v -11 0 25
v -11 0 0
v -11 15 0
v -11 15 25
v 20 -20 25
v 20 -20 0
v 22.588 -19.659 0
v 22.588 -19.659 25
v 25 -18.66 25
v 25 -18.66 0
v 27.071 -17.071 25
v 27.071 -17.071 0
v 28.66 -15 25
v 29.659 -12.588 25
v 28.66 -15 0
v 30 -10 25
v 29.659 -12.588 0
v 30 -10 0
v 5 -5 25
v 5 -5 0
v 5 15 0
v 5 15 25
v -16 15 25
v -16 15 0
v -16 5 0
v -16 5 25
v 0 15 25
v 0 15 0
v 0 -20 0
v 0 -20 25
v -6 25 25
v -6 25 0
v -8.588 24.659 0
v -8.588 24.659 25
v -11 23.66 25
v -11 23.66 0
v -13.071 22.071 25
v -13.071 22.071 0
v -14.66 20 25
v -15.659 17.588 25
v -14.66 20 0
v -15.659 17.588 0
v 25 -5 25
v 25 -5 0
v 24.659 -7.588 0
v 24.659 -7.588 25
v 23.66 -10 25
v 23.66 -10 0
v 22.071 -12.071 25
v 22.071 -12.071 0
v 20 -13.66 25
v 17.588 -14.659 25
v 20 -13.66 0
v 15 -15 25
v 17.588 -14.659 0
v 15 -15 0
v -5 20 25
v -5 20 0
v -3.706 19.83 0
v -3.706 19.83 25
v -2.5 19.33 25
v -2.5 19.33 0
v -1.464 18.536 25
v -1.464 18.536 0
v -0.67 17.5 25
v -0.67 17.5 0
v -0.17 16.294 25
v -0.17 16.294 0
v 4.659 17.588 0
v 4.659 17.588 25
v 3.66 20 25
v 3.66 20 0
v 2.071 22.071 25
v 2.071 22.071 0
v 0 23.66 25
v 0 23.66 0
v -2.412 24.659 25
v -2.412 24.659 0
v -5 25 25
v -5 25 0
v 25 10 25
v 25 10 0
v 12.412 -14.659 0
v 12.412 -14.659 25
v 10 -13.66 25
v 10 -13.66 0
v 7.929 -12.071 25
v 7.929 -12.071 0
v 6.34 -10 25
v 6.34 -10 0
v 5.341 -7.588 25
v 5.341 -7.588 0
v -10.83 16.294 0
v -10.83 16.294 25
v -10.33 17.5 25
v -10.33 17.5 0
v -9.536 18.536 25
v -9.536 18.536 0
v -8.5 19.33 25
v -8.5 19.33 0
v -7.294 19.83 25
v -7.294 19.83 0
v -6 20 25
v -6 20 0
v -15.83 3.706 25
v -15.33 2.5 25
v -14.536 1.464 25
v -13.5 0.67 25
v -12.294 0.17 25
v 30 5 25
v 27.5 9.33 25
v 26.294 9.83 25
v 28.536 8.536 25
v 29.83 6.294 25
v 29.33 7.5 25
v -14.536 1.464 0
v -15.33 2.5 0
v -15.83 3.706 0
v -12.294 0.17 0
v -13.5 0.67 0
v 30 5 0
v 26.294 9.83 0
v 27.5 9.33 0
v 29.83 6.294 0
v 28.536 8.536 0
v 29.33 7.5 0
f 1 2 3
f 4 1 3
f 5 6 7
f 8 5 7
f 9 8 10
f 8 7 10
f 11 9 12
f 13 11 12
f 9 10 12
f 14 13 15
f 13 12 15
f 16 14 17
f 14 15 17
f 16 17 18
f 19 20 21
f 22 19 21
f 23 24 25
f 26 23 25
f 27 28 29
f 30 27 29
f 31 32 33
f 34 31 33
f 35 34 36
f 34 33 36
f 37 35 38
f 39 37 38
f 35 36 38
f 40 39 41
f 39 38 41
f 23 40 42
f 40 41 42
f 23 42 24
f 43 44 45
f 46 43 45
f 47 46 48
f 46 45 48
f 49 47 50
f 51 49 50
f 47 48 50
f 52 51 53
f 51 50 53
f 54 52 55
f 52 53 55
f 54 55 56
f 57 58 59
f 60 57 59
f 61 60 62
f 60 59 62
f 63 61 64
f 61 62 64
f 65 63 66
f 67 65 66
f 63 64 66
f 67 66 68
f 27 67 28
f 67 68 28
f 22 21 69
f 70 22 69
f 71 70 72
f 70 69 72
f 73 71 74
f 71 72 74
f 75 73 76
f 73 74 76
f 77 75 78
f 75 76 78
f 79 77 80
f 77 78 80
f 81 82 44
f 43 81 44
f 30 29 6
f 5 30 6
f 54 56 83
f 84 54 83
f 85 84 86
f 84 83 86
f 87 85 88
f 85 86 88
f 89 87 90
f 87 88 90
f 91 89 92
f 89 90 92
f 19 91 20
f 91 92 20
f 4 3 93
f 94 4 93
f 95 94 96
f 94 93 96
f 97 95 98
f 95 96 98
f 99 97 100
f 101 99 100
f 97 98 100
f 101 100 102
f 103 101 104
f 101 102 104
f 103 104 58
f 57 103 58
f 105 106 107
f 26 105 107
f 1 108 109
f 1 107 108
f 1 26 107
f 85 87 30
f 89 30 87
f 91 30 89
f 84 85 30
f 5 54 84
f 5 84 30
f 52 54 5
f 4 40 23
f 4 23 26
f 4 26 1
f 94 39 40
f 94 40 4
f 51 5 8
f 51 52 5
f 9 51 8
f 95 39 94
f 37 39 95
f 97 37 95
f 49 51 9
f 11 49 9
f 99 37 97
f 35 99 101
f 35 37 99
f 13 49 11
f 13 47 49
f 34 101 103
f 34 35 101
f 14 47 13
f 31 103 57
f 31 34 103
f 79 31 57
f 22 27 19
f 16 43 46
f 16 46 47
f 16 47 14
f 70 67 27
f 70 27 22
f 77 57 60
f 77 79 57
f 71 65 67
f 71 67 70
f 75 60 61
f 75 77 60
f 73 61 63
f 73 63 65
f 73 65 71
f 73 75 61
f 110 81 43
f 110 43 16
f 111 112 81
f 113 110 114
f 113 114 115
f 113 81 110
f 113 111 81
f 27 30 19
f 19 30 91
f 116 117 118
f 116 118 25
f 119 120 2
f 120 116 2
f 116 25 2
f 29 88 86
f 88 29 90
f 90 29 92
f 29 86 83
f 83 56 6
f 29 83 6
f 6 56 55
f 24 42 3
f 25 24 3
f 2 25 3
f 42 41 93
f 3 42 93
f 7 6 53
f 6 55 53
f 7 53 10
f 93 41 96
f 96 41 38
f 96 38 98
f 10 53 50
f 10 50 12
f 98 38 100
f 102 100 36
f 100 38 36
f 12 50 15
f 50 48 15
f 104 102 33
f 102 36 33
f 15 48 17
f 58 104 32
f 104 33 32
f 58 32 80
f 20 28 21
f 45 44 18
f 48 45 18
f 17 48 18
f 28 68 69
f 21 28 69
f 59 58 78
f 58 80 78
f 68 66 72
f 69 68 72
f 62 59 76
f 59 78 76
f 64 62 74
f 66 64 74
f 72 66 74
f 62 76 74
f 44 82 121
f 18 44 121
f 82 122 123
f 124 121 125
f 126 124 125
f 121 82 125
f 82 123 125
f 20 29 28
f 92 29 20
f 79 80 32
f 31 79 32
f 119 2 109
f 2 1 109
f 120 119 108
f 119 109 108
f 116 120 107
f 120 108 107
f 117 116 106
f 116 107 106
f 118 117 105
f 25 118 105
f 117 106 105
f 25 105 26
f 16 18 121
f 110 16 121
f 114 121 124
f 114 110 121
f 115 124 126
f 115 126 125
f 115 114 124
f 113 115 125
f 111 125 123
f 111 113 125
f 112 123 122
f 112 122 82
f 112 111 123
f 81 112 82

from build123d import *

# Parameters (mm, degrees)
F1_DEPTH = 25
F2_R     = 4.99999
F3_R     = 4.99999


# Not quite as in the source:
# - a fillet or chamfer is up to 0.001 mm smaller than in the source, because OpenCascade refuses the exact size


with BuildPart() as f1:
    # F0 (on Top) → F1 (new body)
    with BuildSketch(Plane.XY):
        with BuildLine():
            Line((-16, 0), (-11, 0))
            Line((-11, 0), (-11, 15))
            ThreePointArc((-11, 15), (-9.5355339059, 18.5355339059), (-6, 20))
            Line((-6, 20), (-5, 20))
            ThreePointArc((-5, 20), (-1.4644660941, 18.5355339059), (0, 15))
            Line((0, 15), (0, -20))
            Line((0, -20), (20, -20))
            ThreePointArc((20, -20), (27.0710678119, -17.0710678119), (30, -10))
            Line((30, -10), (30, 10))
            Line((30, 10), (25, 10))
            Line((25, 10), (25, -1.100000754))
            Line((25, -1.100000754), (25, -5))
            ThreePointArc((25, -5), (22.0710678119, -12.0710678119), (15, -15))
            ThreePointArc((15, -15), (7.9289321881, -12.0710678119), (5, -5))
            Line((5, -5), (5, 15))
            ThreePointArc((5, 15), (2.0710678119, 22.0710678119), (-5, 25))
            Line((-5, 25), (-6, 25))
            ThreePointArc((-6, 25), (-13.0710678119, 22.0710678119), (-16, 15))
            Line((-16, 15), (-16, 0))
        make_face()
    extrude(amount=F1_DEPTH)

    # F2 (radius 5 in the source; OpenCascade refuses exactly that, so slightly less here)
    f2_edges = [f1.edges().sort_by_distance(p)[0] for p in [
        (30, 10, 12.5),
    ]]
    fillet(f2_edges, radius=F2_R)

    # F3 (radius 5 in the source; OpenCascade refuses exactly that, so slightly less here)
    f3_edges = [f1.edges().sort_by_distance(p)[0] for p in [
        (-16, 0, 12.5),
    ]]
    fillet(f3_edges, radius=F3_R)


solid = f1.part
